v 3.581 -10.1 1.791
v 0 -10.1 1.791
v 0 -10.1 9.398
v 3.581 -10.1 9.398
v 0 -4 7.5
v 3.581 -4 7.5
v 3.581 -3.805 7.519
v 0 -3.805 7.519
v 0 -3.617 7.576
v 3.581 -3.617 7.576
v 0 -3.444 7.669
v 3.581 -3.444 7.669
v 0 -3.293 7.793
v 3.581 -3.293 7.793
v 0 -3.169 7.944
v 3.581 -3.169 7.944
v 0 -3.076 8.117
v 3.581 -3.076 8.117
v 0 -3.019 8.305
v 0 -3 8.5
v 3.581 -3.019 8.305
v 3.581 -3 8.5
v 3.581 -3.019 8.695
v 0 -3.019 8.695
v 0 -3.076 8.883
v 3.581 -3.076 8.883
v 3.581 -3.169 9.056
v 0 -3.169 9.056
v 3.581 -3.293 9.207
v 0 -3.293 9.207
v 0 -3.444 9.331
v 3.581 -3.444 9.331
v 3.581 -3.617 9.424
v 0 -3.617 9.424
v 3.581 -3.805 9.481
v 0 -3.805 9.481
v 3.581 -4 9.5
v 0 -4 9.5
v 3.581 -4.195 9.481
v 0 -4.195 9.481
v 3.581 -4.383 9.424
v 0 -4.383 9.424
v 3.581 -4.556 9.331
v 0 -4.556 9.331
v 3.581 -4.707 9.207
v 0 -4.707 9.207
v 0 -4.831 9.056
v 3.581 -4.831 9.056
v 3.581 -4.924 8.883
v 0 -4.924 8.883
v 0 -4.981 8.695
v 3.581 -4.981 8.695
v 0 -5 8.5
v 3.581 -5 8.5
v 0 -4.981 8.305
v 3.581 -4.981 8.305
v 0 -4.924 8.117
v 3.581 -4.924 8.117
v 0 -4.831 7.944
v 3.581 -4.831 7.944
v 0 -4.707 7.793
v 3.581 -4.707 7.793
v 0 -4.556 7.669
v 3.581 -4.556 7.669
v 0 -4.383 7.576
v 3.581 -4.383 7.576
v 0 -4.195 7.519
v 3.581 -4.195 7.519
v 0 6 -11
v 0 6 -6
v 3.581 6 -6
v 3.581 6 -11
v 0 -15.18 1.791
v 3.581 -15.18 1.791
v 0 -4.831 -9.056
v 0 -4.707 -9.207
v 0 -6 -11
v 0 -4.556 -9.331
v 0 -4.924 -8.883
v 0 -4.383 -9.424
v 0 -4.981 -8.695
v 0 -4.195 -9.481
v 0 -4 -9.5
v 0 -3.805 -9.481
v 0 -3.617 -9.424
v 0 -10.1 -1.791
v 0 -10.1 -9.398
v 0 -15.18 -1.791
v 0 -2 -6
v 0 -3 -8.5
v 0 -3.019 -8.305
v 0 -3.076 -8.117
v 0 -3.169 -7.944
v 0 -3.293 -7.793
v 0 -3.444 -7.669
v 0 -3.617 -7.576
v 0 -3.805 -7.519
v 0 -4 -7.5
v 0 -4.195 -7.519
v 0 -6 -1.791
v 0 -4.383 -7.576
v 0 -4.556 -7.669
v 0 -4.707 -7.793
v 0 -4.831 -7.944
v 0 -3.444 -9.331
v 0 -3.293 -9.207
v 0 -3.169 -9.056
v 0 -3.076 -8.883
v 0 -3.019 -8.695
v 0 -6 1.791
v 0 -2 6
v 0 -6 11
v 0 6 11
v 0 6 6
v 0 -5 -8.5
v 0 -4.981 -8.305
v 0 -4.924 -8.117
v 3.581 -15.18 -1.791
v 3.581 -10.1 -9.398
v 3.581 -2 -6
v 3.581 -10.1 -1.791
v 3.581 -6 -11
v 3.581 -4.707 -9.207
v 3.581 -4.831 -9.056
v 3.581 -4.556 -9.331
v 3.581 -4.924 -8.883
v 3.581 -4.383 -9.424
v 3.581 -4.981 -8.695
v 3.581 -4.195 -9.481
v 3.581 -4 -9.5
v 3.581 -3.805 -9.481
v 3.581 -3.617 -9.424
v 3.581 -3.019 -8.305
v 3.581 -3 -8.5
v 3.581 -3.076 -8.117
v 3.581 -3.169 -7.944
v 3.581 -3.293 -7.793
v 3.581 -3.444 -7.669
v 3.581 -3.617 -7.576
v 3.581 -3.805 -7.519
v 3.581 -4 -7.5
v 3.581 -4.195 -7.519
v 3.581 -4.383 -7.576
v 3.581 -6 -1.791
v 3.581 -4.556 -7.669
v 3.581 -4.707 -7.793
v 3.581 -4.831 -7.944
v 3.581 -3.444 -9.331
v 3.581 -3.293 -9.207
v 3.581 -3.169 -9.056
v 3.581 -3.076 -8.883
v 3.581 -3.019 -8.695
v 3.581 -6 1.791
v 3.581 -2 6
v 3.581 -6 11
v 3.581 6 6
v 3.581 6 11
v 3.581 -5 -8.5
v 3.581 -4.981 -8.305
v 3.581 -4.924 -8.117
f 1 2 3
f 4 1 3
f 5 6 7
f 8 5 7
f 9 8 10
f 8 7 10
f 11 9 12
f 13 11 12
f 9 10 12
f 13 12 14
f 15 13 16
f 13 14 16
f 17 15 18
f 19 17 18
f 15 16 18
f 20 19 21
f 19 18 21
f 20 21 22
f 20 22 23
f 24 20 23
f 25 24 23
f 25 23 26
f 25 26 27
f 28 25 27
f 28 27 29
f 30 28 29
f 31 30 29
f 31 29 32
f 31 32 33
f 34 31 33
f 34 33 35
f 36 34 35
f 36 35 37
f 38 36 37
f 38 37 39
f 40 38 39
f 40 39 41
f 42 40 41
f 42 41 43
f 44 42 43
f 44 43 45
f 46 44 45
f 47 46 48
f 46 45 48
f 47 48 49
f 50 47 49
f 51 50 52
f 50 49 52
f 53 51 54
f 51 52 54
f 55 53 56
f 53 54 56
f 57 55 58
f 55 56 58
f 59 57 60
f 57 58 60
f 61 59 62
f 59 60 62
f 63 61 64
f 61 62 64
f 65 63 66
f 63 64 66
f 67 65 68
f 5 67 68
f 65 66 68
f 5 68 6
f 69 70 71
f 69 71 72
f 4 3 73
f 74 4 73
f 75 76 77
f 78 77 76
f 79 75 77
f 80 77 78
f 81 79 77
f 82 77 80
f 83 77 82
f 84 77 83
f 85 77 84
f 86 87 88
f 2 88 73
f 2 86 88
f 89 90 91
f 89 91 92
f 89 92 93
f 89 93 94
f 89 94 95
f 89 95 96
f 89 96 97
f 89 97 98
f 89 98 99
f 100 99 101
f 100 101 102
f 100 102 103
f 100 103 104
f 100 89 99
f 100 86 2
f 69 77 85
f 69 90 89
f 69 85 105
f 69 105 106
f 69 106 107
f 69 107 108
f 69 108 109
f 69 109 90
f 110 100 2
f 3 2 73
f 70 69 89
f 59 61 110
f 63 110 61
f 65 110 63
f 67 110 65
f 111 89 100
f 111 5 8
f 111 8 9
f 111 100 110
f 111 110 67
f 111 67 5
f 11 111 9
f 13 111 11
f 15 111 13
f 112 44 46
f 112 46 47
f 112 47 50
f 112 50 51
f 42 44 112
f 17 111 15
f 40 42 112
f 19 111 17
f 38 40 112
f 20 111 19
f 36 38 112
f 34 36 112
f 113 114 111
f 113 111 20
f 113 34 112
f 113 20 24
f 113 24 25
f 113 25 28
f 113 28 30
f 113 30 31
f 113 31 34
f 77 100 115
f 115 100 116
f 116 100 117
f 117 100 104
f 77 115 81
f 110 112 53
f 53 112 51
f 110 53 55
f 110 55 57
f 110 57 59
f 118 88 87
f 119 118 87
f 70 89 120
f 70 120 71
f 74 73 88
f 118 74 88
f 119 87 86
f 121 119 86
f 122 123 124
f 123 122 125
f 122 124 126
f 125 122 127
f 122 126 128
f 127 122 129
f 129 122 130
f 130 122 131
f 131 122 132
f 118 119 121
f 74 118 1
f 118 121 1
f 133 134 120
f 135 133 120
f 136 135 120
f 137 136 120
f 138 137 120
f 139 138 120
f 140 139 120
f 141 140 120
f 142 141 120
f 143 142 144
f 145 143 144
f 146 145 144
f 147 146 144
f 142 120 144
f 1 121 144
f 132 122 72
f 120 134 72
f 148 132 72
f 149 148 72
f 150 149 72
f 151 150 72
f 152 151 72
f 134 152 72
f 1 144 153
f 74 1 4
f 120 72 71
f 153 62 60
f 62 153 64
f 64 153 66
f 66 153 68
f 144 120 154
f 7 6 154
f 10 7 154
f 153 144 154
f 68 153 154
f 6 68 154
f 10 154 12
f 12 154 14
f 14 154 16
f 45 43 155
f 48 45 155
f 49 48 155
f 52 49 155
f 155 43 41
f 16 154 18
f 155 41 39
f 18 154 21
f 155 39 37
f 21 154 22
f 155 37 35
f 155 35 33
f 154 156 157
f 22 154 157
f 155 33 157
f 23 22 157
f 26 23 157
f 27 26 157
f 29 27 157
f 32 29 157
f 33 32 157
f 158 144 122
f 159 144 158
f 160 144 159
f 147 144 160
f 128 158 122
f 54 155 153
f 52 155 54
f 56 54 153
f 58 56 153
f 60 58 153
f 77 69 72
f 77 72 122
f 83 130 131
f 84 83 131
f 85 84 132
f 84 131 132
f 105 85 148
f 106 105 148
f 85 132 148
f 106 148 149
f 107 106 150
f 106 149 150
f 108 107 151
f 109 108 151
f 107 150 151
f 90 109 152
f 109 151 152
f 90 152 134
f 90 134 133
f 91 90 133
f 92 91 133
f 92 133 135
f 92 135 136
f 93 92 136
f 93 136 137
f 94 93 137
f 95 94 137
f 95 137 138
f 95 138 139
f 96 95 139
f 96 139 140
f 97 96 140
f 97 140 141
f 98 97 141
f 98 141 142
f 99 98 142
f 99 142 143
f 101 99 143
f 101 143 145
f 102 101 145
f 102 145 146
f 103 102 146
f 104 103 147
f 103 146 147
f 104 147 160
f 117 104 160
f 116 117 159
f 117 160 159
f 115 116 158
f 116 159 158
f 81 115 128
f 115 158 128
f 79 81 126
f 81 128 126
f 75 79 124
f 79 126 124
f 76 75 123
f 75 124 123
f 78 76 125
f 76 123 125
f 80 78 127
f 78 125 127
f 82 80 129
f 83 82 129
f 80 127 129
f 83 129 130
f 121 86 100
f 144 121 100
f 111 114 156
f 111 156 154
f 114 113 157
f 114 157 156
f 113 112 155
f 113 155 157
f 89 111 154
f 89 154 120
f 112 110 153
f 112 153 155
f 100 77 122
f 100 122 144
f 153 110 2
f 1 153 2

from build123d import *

# Parameters (mm, degrees)
BOSS_EXTRUDE1_DEPTH = 3.5814
SKETCH7_R           = 1
CUT_EXTRUDE5_DEPTH  = 4.5814
BOSS_EXTRUDE3_DEPTH = 3.5814


with BuildPart() as part:
    # Sketch1 → Boss-Extrude1 (new body)
    with BuildSketch(Plane(origin=(0, 0, 0), x_dir=(0, 0, -1), z_dir=(1, 0, 0))):
        Polygon((-6, 6), (-6, -2), (6, -2), (6, 6), (11, 6), (11, -6), (-11, -6), (-11, 6), align=None)
    extrude(amount=BOSS_EXTRUDE1_DEPTH)

    # Sketch7 → Cut-Extrude5 (cut, through all)
    with BuildSketch(Plane(origin=(3.5814, 0, 0), x_dir=(0, 0, -1), z_dir=(1, 0, 0))):
        with Locations((-8.5, -4)):
            Circle(SKETCH7_R)
        with Locations((8.5, -4)):
            Circle(SKETCH7_R)
    extrude(amount=-CUT_EXTRUDE5_DEPTH, mode=Mode.SUBTRACT)

    # Sketch8 → Boss-Extrude3 (add)
    with BuildSketch(Plane(origin=(0, 0, 0), x_dir=(0, 0, -1), z_dir=(1, 0, 0))):
        Polygon((-1.7907, -10.1), (-9.398, -10.1), (-1.7907, -15.18), (1.7907, -15.18), (9.398, -10.1), (1.7907, -10.1), (1.7907, -6), (-1.7907, -6), align=None)
    extrude(amount=BOSS_EXTRUDE3_DEPTH)


solid = part.part
